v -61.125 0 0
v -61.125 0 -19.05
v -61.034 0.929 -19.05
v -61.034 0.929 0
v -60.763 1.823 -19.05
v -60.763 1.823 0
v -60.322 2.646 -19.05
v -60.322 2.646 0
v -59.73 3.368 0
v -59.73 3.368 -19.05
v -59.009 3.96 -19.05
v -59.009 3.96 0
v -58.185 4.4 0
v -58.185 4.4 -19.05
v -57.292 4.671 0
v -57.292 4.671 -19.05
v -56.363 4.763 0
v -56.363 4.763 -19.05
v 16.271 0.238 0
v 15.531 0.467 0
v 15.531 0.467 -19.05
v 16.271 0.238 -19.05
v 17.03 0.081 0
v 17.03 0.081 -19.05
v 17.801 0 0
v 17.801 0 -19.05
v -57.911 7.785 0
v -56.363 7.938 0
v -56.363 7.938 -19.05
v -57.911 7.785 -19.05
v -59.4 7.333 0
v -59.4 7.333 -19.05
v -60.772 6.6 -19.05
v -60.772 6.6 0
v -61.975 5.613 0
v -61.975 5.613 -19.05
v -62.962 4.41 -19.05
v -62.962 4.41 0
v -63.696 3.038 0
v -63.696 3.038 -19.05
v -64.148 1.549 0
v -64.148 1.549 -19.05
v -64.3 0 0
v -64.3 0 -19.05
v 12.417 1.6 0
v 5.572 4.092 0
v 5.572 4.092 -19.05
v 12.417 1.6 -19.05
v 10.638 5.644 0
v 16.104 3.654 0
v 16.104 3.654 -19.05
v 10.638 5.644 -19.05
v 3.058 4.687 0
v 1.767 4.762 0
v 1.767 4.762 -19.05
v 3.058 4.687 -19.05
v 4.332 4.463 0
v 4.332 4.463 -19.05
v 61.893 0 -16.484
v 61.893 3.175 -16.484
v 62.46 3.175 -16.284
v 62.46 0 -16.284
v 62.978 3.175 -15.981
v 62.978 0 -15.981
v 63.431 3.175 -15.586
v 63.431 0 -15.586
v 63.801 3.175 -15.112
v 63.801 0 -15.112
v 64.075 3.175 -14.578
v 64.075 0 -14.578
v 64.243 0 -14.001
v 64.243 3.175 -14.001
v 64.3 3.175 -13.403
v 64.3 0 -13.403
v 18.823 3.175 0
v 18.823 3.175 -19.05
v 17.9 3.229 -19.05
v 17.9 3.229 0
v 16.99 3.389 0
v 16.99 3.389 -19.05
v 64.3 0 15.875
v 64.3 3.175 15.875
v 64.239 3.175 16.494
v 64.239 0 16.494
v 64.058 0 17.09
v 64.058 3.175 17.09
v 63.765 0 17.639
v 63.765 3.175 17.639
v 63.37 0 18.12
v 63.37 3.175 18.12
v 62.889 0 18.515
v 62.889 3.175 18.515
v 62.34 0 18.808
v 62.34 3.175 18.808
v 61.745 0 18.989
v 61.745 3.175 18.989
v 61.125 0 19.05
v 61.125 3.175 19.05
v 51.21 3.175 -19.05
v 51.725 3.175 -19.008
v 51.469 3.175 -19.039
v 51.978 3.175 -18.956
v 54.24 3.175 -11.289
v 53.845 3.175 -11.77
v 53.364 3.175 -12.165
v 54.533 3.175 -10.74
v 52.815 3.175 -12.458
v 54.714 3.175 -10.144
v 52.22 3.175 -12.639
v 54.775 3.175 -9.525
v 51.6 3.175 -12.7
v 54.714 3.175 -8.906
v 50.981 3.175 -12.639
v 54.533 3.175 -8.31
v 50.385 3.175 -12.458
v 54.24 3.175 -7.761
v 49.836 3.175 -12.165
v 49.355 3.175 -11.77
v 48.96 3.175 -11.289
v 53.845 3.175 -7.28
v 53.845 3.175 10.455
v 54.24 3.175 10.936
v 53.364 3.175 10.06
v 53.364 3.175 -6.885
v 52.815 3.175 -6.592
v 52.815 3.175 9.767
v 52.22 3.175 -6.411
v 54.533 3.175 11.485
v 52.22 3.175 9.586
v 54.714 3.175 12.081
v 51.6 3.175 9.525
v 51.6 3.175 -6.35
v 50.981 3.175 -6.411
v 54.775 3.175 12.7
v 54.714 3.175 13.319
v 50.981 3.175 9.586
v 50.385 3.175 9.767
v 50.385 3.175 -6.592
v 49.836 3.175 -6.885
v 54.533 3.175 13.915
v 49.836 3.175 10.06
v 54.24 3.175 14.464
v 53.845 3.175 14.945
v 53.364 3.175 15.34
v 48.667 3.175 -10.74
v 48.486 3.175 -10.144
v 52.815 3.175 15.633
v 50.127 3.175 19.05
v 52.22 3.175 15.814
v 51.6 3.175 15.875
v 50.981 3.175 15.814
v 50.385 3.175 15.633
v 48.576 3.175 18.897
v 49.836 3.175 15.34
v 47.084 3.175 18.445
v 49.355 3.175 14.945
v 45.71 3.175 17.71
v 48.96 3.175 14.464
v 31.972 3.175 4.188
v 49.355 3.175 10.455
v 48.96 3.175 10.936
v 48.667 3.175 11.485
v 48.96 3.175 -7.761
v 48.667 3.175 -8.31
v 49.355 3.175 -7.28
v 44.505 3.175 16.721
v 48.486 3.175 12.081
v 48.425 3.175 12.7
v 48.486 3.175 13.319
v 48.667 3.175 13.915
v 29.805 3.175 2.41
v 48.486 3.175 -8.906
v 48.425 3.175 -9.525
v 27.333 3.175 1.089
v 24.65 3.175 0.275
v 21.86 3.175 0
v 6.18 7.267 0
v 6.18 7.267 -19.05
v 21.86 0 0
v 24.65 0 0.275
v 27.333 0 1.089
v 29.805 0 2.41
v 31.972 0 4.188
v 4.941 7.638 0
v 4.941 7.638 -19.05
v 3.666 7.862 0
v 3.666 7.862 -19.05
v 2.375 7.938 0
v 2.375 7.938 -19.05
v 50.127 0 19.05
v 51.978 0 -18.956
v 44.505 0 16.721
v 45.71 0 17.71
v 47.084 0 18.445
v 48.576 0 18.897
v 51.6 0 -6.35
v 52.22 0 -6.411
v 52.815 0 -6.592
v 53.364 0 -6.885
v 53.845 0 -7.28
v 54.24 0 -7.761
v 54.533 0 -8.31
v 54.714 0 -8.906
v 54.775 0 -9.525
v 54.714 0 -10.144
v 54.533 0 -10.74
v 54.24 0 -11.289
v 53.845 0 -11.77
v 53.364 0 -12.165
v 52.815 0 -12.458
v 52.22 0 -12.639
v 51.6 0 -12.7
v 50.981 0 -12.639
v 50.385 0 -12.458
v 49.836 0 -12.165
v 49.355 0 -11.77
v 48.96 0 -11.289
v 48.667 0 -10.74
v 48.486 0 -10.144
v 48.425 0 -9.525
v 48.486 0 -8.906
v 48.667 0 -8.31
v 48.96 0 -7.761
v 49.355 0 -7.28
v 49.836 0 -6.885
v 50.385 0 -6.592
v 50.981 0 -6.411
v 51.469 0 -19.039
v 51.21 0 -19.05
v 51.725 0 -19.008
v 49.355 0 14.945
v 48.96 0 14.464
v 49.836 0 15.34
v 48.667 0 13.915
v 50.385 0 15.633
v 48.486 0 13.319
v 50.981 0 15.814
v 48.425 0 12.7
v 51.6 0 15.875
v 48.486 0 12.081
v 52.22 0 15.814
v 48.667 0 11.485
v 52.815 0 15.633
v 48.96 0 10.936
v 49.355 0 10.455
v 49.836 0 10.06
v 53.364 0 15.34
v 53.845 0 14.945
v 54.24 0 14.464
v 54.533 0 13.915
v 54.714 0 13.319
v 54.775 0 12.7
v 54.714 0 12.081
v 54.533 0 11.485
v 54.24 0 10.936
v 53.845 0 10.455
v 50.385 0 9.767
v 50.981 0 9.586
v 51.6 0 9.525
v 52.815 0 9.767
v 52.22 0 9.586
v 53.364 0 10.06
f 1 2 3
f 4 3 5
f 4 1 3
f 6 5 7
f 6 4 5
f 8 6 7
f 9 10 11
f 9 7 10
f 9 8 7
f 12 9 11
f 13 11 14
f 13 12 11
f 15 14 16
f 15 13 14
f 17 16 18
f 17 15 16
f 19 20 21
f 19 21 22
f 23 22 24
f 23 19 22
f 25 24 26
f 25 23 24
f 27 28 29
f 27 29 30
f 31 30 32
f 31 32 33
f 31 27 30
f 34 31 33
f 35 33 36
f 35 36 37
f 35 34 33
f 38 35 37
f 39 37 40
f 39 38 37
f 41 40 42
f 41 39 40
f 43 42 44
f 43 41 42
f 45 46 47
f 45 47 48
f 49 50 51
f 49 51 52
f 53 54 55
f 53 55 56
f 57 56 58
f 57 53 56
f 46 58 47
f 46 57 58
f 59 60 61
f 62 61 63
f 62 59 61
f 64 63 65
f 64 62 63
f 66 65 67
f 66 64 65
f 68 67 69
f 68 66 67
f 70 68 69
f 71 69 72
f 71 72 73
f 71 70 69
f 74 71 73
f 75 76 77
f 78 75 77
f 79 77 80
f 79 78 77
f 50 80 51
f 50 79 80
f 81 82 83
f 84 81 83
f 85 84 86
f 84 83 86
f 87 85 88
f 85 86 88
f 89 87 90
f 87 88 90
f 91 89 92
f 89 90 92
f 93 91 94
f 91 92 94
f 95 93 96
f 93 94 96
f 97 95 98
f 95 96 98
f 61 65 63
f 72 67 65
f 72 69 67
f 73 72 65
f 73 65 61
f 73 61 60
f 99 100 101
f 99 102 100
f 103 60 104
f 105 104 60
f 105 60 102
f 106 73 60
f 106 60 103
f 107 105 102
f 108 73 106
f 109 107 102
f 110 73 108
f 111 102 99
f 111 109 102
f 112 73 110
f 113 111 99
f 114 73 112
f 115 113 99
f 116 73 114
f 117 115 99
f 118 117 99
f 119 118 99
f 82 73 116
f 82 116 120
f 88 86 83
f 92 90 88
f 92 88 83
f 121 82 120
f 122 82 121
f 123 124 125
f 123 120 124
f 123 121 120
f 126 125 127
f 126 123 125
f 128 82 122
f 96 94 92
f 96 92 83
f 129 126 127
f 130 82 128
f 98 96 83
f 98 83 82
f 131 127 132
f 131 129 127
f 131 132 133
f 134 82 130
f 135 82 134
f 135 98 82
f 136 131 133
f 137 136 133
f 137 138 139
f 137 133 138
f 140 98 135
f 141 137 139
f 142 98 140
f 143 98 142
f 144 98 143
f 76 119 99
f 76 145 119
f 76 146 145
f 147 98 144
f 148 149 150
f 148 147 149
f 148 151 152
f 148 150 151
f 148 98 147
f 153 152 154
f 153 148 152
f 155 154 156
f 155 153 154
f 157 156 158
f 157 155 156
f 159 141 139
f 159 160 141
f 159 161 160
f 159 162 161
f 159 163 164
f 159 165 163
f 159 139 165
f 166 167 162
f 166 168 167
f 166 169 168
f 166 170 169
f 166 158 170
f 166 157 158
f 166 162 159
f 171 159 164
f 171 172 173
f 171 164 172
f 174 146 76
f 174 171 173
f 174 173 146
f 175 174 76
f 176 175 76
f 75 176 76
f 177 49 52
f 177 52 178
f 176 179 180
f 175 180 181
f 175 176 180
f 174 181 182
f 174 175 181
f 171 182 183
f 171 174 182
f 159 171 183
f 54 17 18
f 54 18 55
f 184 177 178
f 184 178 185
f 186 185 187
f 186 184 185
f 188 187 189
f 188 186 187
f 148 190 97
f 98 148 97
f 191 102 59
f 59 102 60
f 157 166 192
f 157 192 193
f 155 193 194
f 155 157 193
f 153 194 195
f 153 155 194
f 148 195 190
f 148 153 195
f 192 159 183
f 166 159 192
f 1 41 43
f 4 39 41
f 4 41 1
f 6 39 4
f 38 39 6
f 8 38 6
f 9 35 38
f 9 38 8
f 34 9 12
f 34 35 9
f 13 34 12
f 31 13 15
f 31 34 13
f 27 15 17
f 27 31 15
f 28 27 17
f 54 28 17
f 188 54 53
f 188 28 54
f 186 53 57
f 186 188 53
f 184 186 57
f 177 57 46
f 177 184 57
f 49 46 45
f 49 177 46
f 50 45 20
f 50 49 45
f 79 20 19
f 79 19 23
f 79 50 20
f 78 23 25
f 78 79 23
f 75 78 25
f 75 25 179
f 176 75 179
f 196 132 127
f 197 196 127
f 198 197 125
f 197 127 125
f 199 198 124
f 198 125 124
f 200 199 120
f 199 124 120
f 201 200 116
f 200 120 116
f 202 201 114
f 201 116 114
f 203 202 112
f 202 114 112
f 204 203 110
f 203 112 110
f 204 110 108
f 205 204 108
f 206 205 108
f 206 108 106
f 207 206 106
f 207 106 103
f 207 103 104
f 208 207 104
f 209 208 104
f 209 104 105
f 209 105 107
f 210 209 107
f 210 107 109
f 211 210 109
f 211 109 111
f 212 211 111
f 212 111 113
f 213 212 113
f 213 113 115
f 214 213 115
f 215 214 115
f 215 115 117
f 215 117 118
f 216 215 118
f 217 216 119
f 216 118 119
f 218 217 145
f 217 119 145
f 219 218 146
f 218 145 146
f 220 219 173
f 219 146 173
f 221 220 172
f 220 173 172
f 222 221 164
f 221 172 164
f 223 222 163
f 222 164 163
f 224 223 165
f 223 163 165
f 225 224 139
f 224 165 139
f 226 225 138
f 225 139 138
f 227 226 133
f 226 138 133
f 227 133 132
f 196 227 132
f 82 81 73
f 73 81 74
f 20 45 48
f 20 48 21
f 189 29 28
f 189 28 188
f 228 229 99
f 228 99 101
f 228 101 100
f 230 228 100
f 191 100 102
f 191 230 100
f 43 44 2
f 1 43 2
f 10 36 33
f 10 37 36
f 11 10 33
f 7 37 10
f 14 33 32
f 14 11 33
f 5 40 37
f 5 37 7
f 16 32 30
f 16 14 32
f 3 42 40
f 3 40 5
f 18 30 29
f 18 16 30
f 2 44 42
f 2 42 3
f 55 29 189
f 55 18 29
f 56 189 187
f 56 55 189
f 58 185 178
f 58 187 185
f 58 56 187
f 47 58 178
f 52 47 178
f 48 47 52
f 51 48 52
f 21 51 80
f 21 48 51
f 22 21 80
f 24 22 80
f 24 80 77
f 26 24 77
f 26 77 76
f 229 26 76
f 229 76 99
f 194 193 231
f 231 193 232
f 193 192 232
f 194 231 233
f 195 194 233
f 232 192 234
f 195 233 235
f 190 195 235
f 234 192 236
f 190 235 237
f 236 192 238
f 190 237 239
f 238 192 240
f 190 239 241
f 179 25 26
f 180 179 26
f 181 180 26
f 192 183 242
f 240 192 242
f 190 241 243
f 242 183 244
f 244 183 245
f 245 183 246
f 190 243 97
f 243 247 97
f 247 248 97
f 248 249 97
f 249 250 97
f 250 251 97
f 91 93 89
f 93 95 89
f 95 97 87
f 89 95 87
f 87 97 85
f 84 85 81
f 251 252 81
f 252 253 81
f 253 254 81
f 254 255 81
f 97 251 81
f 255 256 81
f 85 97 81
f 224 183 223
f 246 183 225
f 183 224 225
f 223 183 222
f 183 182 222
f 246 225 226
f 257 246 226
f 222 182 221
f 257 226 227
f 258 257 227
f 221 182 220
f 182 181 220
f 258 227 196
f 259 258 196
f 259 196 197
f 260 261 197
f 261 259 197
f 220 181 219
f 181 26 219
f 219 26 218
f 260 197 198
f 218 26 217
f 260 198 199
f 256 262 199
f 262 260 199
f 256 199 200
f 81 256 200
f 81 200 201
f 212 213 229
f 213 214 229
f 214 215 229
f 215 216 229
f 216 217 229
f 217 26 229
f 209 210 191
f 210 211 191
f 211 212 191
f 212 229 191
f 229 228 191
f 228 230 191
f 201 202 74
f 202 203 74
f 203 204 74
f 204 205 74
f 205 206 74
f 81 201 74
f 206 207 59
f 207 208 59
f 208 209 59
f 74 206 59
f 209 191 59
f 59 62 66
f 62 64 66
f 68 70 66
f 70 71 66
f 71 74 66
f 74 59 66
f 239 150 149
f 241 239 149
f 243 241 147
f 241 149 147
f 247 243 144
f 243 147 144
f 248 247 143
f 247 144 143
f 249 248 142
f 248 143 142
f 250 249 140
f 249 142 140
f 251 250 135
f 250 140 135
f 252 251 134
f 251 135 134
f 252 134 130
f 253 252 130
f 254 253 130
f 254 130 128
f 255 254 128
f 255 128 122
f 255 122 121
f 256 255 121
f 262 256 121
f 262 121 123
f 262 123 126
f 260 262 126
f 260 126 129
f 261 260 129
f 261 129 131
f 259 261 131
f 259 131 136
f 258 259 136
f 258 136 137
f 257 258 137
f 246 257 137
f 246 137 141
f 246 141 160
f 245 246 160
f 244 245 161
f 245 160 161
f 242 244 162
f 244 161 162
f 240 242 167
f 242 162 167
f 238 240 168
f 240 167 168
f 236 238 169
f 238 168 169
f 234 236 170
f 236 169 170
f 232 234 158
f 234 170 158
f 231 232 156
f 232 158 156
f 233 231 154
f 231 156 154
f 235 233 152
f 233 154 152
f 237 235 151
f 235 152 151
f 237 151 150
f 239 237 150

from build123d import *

# Parameters (mm, degrees)
SKETCH2_W               = 128.6002
SKETCH2_H               = 38.1
BOSS_EXTRUDE1_DEPTH     = 7.9375
CUT_EXTRUDE1_DEPTH      = 7.9375
CUT_EXTRUDE3_DEPTH      = 7.9375
FILLET3_R               = 3.175
SKETCH6_R               = 3.175
CUT_EXTRUDE4_DEPTH      = 7.9375
CUT_EXTRUDE8_DEPTH      = 76.160606479
CUT_EXTRUDE8_DEPTH_BACK = 76.160606479
SKETCH12_W              = 13.089840981
SKETCH12_H              = 4.7625


with BuildPart() as part:
    # Sketch2 → Boss-Extrude1 (new body)
    with BuildSketch(Plane(origin=(0, 0, 0), x_dir=(1, 0, 0), z_dir=(0, 1, 0))):
        Rectangle(SKETCH2_W, SKETCH2_H)
    extrude(amount=BOSS_EXTRUDE1_DEPTH)

    # Sketch4 → Cut-Extrude1 (cut)
    with BuildSketch(Plane(origin=(0, 7.9375, 0), x_dir=(1, 0, 0), z_dir=(0, 1, 0))):
        Polygon((64.3001, 19.05), (51.6001, 19.05), (64.3001, 15.883534364), align=None)
    extrude(amount=-CUT_EXTRUDE1_DEPTH, mode=Mode.SUBTRACT)

    # Sketch5 → Cut-Extrude3 (cut)
    with BuildSketch(Plane(origin=(0, 7.9375, 0), x_dir=(1, 0, 0), z_dir=(0, 1, 0))):
        with BuildLine():
            Line((-64.3001, 0), (21.860482552, 0))
            ThreePointArc((21.860482552, 0), (27.332932171, -1.088537909), (31.972250944, -4.188431608))
            Line((31.972250944, -4.188431608), (44.505259668, -16.721440332))
            ThreePointArc((44.505259668, -16.721440332), (47.084490176, -18.444827059), (50.1269, -19.05))
            Line((50.1269, -19.05), (-64.3001, -19.05))
            Line((-64.3001, -19.05), (-64.3001, 0))
        make_face()
    extrude(amount=-CUT_EXTRUDE3_DEPTH, mode=Mode.SUBTRACT)

    # Fillet3
    fillet3_edges = [part.edges().sort_by_distance(p)[0] for p in [
        (64.3001, 3.96875, -15.883534364),
        (51.6001, 3.96875, -19.05),
        (64.3001, 3.96875, 19.05),
    ]]
    fillet(fillet3_edges, radius=FILLET3_R)

    # Sketch6 → Cut-Extrude4 (cut)
    with BuildSketch(Plane(origin=(0, 7.9375, 0), x_dir=(1, 0, 0), z_dir=(0, 1, 0))):
        with Locations(Location((51.6001, 9.525, 0), (0, 0, 270))):
            Circle(SKETCH6_R)
        with Locations(Location((51.6001, -12.7, 0), (0, 0, 270))):
            Circle(SKETCH6_R)
    extrude(amount=-CUT_EXTRUDE4_DEPTH, mode=Mode.SUBTRACT)

    # Sketch12 → Cut-Extrude8 (cut, two sides: drawn at the far end of the back side and taken through both)
    with BuildSketch(Plane(origin=(0, 0, -19.05), x_dir=(-1, 0, 0), z_dir=(0, 0, -1)).offset(-CUT_EXTRUDE8_DEPTH_BACK)):
        with BuildLine():
            Line((-10.637677607, 5.644085453), (-6.179942499, 7.266568345))
            ThreePointArc((-6.179942499, 7.266568345), (-4.306770706, 7.768483214), (-2.3749, 7.9375))
            Line((-2.3749, 7.9375), (-51.210259019, 7.9375))
            Line((-51.210259019, 7.9375), (-51.210259019, 3.175))
            Line((-51.210259019, 3.175), (-24.615767874, 3.175))
            Line((-24.615767874, 3.175), (-18.823268898, 3.175))
            ThreePointArc((-18.823268898, 3.175), (-17.442731156, 3.295781402), (-16.104140354, 3.654455726))
            Line((-16.104140354, 3.654455726), (-10.637677607, 5.644085453))
        make_face()
        with Locations((-57.75517951, 5.55625)):
            Rectangle(SKETCH12_W, SKETCH12_H)
        with BuildLine():
            ThreePointArc((56.3626, 7.9375), (61.975260076, 5.612660076), (64.3001, 0))
            Line((64.3001, 0), (64.3001, 7.9375))
            Line((64.3001, 7.9375), (56.3626, 7.9375))
        make_face()
        with BuildLine():
            ThreePointArc((61.1251, 0), (59.730196045, 3.367596045), (56.3626, 4.7625))
            Line((56.3626, 4.7625), (-1.766638139, 4.7625))
            ThreePointArc((-1.766638139, 4.7625), (-3.698508845, 4.593483214), (-5.571680637, 4.091568345))
            Line((-5.571680637, 4.091568345), (-12.417211155, 1.599998998))
            Line((-12.417211155, 1.599998998), (-15.530771457, 0.466755726))
            ThreePointArc((-15.530771457, 0.466755726), (-16.648641249, 0.150225095), (-17.800707625, 0))
            Line((-17.800707625, 0), (48.4251, 0))
            Line((48.4251, 0), (51.6001, 0))
            Line((51.6001, 0), (61.1251, 0))
        make_face()
    extrude(amount=CUT_EXTRUDE8_DEPTH + CUT_EXTRUDE8_DEPTH_BACK, mode=Mode.SUBTRACT)


solid = part.part
